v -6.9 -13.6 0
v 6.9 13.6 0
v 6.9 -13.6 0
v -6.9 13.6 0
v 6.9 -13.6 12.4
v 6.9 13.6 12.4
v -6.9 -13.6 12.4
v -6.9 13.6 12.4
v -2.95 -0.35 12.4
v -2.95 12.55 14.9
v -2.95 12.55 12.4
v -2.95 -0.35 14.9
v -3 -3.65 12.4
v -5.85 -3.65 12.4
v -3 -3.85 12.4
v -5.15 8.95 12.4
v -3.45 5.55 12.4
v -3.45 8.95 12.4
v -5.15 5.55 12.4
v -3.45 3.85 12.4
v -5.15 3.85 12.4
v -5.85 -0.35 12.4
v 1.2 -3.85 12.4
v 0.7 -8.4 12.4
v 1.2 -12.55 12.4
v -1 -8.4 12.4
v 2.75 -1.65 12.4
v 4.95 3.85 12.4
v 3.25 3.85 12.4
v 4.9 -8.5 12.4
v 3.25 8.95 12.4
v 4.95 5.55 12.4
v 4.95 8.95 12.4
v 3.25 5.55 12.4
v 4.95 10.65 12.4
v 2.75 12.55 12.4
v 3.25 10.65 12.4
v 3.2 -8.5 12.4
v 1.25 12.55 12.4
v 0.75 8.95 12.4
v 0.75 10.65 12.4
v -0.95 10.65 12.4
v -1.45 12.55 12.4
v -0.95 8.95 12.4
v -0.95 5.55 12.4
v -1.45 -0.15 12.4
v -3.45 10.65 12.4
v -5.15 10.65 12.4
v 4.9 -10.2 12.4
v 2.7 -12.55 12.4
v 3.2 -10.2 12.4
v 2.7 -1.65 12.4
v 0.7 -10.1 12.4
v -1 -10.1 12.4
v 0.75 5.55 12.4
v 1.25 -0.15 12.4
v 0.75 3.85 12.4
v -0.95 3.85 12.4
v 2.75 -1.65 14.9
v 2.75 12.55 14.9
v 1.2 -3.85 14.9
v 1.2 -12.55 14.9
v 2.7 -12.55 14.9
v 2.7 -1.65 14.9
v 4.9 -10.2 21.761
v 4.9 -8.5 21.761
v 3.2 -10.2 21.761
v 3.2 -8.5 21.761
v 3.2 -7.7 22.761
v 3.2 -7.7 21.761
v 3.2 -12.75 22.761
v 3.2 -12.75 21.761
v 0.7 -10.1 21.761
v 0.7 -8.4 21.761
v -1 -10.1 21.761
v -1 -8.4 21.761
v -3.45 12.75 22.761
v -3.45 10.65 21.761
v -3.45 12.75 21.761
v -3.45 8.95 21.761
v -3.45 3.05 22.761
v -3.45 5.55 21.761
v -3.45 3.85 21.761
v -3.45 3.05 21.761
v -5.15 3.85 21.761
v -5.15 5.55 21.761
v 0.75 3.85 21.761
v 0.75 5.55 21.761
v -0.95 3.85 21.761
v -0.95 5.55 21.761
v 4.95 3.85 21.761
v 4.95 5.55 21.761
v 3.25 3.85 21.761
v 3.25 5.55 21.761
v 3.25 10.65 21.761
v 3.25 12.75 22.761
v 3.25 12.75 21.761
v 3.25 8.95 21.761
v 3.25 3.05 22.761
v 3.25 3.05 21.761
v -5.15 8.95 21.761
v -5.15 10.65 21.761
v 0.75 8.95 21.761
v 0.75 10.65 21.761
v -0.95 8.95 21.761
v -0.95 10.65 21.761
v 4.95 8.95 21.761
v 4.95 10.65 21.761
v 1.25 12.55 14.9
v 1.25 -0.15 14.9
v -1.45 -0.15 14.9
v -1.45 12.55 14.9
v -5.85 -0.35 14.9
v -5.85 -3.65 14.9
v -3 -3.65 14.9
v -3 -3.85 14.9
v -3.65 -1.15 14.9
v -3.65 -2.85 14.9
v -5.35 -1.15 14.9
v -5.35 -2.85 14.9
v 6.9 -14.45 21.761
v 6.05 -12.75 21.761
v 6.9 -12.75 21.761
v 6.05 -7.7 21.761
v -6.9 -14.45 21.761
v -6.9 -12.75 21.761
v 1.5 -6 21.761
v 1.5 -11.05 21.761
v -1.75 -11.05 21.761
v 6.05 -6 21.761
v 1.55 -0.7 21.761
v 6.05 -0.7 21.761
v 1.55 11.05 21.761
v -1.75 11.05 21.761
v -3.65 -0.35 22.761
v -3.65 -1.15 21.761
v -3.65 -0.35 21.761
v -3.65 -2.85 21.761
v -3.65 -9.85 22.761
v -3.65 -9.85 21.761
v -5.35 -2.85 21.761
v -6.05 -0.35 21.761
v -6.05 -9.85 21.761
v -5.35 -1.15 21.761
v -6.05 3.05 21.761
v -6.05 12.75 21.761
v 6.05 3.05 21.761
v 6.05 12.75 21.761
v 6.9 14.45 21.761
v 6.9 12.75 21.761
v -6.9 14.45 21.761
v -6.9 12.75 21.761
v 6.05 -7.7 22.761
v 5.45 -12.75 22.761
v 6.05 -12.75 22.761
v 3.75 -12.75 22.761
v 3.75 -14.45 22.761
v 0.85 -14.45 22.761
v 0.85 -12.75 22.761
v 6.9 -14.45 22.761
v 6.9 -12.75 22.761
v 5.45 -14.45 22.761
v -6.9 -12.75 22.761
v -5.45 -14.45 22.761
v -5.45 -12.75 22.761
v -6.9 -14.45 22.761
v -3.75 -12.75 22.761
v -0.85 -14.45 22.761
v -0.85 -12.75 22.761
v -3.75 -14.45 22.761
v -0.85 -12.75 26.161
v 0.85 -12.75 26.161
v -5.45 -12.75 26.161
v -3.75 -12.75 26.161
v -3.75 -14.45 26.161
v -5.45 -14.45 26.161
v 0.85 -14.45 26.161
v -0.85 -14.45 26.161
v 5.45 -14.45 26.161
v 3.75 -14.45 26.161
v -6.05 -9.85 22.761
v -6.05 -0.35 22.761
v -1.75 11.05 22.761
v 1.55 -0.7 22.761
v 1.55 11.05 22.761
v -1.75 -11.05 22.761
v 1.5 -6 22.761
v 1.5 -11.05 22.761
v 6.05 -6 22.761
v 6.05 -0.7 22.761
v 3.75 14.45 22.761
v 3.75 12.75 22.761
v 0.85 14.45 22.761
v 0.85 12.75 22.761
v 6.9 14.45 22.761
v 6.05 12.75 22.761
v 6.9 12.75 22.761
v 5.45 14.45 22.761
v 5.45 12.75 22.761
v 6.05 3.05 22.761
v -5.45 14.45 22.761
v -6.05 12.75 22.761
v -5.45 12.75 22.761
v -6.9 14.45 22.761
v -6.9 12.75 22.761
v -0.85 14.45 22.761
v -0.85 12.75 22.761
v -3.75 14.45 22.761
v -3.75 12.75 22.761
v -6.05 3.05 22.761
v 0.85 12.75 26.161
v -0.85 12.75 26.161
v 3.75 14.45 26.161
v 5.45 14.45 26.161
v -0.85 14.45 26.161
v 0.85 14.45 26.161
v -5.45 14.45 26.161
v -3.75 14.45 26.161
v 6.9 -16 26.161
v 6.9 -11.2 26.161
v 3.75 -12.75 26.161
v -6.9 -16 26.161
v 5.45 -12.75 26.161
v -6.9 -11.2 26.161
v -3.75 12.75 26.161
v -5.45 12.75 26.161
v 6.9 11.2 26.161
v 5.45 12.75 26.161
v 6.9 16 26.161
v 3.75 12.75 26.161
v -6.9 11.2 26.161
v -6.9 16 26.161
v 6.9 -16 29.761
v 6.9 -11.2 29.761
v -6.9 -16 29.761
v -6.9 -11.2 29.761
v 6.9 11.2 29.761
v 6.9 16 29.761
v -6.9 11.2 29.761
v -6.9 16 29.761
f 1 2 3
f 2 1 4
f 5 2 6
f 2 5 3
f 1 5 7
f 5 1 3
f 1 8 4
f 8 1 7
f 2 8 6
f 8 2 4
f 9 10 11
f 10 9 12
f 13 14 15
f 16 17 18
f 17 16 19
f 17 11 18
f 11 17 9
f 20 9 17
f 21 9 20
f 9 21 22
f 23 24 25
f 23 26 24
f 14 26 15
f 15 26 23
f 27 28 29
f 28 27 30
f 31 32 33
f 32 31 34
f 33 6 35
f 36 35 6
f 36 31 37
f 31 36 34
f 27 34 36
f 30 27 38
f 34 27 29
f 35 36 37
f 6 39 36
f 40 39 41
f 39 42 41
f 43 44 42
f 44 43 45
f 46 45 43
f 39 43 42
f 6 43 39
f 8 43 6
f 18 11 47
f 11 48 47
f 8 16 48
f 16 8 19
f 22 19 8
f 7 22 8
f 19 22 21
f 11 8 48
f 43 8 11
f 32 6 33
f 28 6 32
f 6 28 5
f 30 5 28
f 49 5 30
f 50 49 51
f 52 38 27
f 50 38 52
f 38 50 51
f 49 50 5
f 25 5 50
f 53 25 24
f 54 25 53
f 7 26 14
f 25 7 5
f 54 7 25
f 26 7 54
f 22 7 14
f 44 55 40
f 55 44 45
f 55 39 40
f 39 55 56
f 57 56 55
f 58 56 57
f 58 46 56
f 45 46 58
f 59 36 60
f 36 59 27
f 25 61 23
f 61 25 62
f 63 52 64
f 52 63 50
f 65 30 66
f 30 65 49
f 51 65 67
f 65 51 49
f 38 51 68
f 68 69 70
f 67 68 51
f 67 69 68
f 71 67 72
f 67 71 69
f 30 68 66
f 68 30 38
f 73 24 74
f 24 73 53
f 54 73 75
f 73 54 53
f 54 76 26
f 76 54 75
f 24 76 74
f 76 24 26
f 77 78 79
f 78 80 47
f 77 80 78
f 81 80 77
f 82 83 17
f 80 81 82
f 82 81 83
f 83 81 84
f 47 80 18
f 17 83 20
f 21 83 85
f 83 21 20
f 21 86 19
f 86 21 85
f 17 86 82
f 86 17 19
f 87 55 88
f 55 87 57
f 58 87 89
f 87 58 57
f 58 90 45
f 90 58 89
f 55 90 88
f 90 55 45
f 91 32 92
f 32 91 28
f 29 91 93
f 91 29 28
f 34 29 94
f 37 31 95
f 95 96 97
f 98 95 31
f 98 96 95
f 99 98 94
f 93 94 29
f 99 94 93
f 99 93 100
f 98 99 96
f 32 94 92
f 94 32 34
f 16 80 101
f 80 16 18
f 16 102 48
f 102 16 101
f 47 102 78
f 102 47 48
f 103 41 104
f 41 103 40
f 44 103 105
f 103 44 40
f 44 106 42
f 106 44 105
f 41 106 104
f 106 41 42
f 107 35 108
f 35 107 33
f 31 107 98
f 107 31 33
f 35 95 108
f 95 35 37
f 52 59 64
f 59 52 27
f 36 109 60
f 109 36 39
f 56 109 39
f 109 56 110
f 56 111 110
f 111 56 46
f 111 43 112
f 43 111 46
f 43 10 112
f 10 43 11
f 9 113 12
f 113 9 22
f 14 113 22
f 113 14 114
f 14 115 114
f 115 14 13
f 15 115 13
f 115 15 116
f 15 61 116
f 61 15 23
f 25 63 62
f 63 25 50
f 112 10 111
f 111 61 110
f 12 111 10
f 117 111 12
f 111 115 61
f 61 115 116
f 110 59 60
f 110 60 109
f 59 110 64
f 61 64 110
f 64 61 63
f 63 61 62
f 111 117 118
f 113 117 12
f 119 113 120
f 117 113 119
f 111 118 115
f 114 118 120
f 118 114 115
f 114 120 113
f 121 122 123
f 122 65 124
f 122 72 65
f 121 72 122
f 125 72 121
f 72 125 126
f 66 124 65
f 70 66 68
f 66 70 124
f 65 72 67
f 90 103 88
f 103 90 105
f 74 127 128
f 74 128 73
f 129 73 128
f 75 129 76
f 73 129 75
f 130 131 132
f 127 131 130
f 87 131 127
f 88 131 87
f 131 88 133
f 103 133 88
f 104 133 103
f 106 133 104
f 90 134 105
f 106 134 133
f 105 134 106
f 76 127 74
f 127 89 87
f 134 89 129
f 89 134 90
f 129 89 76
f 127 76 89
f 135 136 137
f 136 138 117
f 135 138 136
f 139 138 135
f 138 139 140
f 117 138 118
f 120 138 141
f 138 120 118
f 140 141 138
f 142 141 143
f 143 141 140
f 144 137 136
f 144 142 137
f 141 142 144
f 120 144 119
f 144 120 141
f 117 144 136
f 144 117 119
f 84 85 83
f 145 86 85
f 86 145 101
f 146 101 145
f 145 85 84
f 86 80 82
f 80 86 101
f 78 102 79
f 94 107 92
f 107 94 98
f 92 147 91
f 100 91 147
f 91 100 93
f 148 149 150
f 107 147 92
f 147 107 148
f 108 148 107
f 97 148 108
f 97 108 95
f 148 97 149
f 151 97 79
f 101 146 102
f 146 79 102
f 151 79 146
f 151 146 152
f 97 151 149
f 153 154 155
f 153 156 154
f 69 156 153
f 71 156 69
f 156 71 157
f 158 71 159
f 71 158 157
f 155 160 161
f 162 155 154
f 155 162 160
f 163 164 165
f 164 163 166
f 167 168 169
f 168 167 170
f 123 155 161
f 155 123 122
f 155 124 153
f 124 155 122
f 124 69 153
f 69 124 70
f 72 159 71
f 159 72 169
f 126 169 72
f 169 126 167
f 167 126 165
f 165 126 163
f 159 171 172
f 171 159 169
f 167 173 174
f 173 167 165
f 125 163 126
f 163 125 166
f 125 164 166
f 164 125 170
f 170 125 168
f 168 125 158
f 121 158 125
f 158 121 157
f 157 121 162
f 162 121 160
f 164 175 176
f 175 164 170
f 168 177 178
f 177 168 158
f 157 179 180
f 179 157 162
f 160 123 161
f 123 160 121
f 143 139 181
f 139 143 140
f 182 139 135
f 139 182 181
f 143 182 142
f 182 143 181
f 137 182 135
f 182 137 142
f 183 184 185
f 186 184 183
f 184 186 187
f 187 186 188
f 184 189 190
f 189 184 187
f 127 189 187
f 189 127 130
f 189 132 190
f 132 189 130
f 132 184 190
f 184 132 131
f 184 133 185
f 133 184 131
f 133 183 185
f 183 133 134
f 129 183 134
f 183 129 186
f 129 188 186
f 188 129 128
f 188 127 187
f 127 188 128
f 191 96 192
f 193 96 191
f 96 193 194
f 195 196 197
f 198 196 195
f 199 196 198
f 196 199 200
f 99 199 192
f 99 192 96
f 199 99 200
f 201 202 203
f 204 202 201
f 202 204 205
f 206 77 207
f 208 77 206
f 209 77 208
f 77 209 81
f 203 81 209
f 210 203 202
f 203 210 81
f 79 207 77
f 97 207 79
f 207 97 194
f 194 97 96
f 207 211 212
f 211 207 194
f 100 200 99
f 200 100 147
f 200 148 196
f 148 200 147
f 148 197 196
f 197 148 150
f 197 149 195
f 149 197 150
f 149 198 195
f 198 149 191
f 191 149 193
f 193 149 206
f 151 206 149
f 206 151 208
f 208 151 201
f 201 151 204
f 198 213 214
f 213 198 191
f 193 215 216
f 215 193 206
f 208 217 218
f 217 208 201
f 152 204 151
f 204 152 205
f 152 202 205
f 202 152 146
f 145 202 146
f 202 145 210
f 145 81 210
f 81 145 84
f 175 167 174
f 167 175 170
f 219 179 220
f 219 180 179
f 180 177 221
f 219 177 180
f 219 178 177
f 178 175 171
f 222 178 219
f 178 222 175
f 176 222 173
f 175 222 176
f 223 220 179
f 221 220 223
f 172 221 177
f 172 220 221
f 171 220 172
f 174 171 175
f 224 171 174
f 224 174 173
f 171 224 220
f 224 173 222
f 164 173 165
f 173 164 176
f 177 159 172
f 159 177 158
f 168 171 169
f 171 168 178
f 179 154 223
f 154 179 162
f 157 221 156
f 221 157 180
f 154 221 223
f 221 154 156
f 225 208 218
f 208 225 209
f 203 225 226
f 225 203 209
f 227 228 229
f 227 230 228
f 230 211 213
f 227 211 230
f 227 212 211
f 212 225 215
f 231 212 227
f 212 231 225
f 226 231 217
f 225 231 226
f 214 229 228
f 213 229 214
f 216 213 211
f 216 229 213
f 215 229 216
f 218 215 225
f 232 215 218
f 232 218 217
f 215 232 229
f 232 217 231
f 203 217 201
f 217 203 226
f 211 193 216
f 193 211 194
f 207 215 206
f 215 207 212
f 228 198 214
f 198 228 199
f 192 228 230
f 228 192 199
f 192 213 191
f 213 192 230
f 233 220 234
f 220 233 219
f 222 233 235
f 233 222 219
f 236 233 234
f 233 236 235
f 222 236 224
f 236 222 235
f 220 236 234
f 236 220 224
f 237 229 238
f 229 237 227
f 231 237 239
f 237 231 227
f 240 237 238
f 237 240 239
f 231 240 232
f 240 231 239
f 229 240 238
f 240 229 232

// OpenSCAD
// Generated by SolidPython 0.4.2 on 2020-09-29 23:20:23
//!OpenSCAD

scale(v = 0.0100000000) {
	translate(v = [-690, -1360, 0]) {
		union() {
			color(c = [0.4000000000, 0.4000000000, 0.4000000000]) {
				translate(v = [0, 0, 0]) {
					linear_extrude(height = 1000.0000000000) {
						polygon(paths = [[0, 1, 2, 3]], points = [[0, 0], [0, 2720], [1380, 2720], [1380, 0]]);
					}
				}
			}
			color(c = [0.2000000000, 0.6000000000, 0.2000000000]) {
				translate(v = [0, 0, 1000.0000000000]) {
					linear_extrude(height = 120.0000000000) {
						polygon(paths = [[0, 1, 2, 3]], points = [[0, 1305], [0, 2720], [1380, 2720], [1380, 1305]]);
					}
				}
			}
			color(c = [0.4000000000, 0.4000000000, 0.4000000000]) {
				translate(v = [0, 0, 1000.0000000000]) {
					linear_extrude(height = 120.0000000000) {
						polygon(paths = [[0, 1, 2, 3]], points = [[0, 0], [0, 1305], [1380, 1305], [1380, 0]]);
					}
				}
			}
			color(c = [0.9000000000, 0.6000000000, 0.6000000000]) {
				translate(v = [0, 0, 1120.0000000000]) {
					linear_extrude(height = 120.0000000000) {
						polygon(paths = [[0, 1, 2, 3]], points = [[135, 1645], [135, 2485], [395, 2485], [395, 1645]]);
					}
				}
			}
			color(c = [0.9000000000, 0.6000000000, 0.6000000000]) {
				translate(v = [0, 0, 1120.0000000000]) {
					linear_extrude(height = 120.0000000000) {
						polygon(paths = [[0, 1, 2, 3]], points = [[545, 1645], [545, 2485], [815, 2485], [815, 1645]]);
					}
				}
			}
			color(c = [0.9000000000, 0.6000000000, 0.6000000000]) {
				translate(v = [0, 0, 1120.0000000000]) {
					linear_extrude(height = 120.0000000000) {
						polygon(paths = [[0, 1, 2, 3]], points = [[965, 1645], [965, 2485], [1245, 2485], [1245, 1645]]);
					}
				}
			}
			color(c = [0.9000000000, 0.6000000000, 0.9000000000]) {
				translate(v = [0, 0, 1120.0000000000]) {
					linear_extrude(height = 120.0000000000) {
						polygon(paths = [[0, 1, 2, 3]], points = [[550, 235], [550, 655], [810, 655], [810, 235]]);
					}
				}
			}
			color(c = [0.9000000000, 0.6000000000, 0.9000000000]) {
				translate(v = [0, 0, 1120.0000000000]) {
					linear_extrude(height = 120.0000000000) {
						polygon(paths = [[0, 1, 2, 3]], points = [[960, 235], [960, 655], [1245, 655], [1245, 235]]);
					}
				}
			}
			color(c = [0.2000000000, 0.6000000000, 0.2000000000]) {
				translate(v = [0, 0, 1120.0000000000]) {
					linear_extrude(height = 120.0000000000) {
						difference() {
							polygon(paths = [[0, 1, 2, 3]], points = [[0, 1305], [0, 2720], [1380, 2720], [1380, 1305]]);
							polygon(paths = [[0, 1, 2, 3]], points = [[135, 1645], [395, 1645], [395, 2485], [135, 2485]]);
							polygon(paths = [[0, 1, 2, 3]], points = [[545, 1645], [815, 1645], [815, 2485], [545, 2485]]);
							polygon(paths = [[0, 1, 2, 3]], points = [[965, 1645], [1245, 1645], [1245, 2485], [965, 2485]]);
						}
					}
				}
			}
			color(c = [0.4000000000, 0.4000000000, 0.4000000000]) {
				translate(v = [0, 0, 1120.0000000000]) {
					linear_extrude(height = 120.0000000000) {
						difference() {
							polygon(paths = [[0, 1, 2, 3]], points = [[0, 0], [0, 1305], [1380, 1305], [1380, 0]]);
							polygon(paths = [[0, 1, 2, 3]], points = [[550, 235], [810, 235], [810, 655], [550, 655]]);
							polygon(paths = [[0, 1, 2, 3]], points = [[960, 235], [1245, 235], [1245, 655], [960, 655]]);
						}
					}
				}
			}
			color(c = [0.1000000000, 0.1000000000, 0.1000000000]) {
				translate(v = [0, 0, 1240.0000000000]) {
					linear_extrude(height = 70.0000000000) {
						polygon(paths = [[0, 1, 2, 3]], points = [[1010, 340], [1010, 510], [1180, 510], [1180, 340]]);
					}
				}
			}
			color(c = [0.1000000000, 0.1000000000, 0.1000000000]) {
				translate(v = [0, 0, 1240.0000000000]) {
					linear_extrude(height = 70.0000000000) {
						polygon(paths = [[0, 1, 2, 3]], points = [[590, 350], [590, 520], [760, 520], [760, 350]]);
					}
				}
			}
			color(c = [0.1000000000, 0.1000000000, 0.1000000000]) {
				translate(v = [0, 0, 1240.0000000000]) {
					linear_extrude(height = 70.0000000000) {
						polygon(paths = [[0, 1, 2, 3]], points = [[175, 1745], [175, 1915], [345, 1915], [345, 1745]]);
					}
				}
			}
			color(c = [0.1000000000, 0.1000000000, 0.1000000000]) {
				translate(v = [0, 0, 1240.0000000000]) {
					linear_extrude(height = 70.0000000000) {
						polygon(paths = [[0, 1, 2, 3]], points = [[595, 1745], [595, 1915], [765, 1915], [765, 1745]]);
					}
				}
			}
			color(c = [0.1000000000, 0.1000000000, 0.1000000000]) {
				translate(v = [0, 0, 1240.0000000000]) {
					linear_extrude(height = 70.0000000000) {
						polygon(paths = [[0, 1, 2, 3]], points = [[1015, 1745], [1015, 1915], [1185, 1915], [1185, 1745]]);
					}
				}
			}
			color(c = [0.1000000000, 0.1000000000, 0.1000000000]) {
				translate(v = [0, 0, 1240.0000000000]) {
					linear_extrude(height = 70.0000000000) {
						polygon(paths = [[0, 1, 2, 3]], points = [[175, 2255], [175, 2425], [345, 2425], [345, 2255]]);
					}
				}
			}
			color(c = [0.1000000000, 0.1000000000, 0.1000000000]) {
				translate(v = [0, 0, 1240.0000000000]) {
					linear_extrude(height = 70.0000000000) {
						polygon(paths = [[0, 1, 2, 3]], points = [[595, 2255], [595, 2425], [765, 2425], [765, 2255]]);
					}
				}
			}
			color(c = [0.1000000000, 0.1000000000, 0.1000000000]) {
				translate(v = [0, 0, 1240.0000000000]) {
					linear_extrude(height = 70.0000000000) {
						polygon(paths = [[0, 1, 2, 3]], points = [[1015, 2255], [1015, 2425], [1185, 2425], [1185, 2255]]);
					}
				}
			}
			color(c = [1.0000000000, 1.0000000000, 1.0000000000]) {
				translate(v = [0, 0, 1240.0000000000]) {
					linear_extrude(height = 70.0000000000) {
						polygon(paths = [[0, 1, 2, 3, 4, 5, 6, 7, 8, 9, 10, 11, 12, 13, 14, 15]], points = [[810, 105], [810, 975], [390, 975], [390, 995], [105, 995], [105, 1325], [395, 1325], [395, 2615], [545, 2615], [545, 1345], [815, 1345], [815, 2615], [965, 2615], [965, 1195], [960, 1195], [960, 105]]);
					}
				}
			}
			color(c = [0.1000000000, 0.1000000000, 0.1000000000]) {
				translate(v = [0, 0, 1310.0000000000]) {
					linear_extrude(height = 180.0000000000) {
						polygon(paths = [[0, 1, 2, 3]], points = [[1010, 340], [1010, 510], [1180, 510], [1180, 340]]);
					}
				}
			}
			color(c = [0.1000000000, 0.1000000000, 0.1000000000]) {
				translate(v = [0, 0, 1310.0000000000]) {
					linear_extrude(height = 180.0000000000) {
						polygon(paths = [[0, 1, 2, 3]], points = [[590, 350], [590, 520], [760, 520], [760, 350]]);
					}
				}
			}
			color(c = [0.1000000000, 0.1000000000, 0.1000000000]) {
				translate(v = [0, 0, 1310.0000000000]) {
					linear_extrude(height = 180.0000000000) {
						polygon(paths = [[0, 1, 2, 3]], points = [[175, 1745], [175, 1915], [345, 1915], [345, 1745]]);
					}
				}
			}
			color(c = [0.1000000000, 0.1000000000, 0.1000000000]) {
				translate(v = [0, 0, 1310.0000000000]) {
					linear_extrude(height = 180.0000000000) {
						polygon(paths = [[0, 1, 2, 3]], points = [[595, 1745], [595, 1915], [765, 1915], [765, 1745]]);
					}
				}
			}
			color(c = [0.1000000000, 0.1000000000, 0.1000000000]) {
				translate(v = [0, 0, 1310.0000000000]) {
					linear_extrude(height = 180.0000000000) {
						polygon(paths = [[0, 1, 2, 3]], points = [[1015, 1745], [1015, 1915], [1185, 1915], [1185, 1745]]);
					}
				}
			}
			color(c = [0.1000000000, 0.1000000000, 0.1000000000]) {
				translate(v = [0, 0, 1310.0000000000]) {
					linear_extrude(height = 180.0000000000) {
						polygon(paths = [[0, 1, 2, 3]], points = [[175, 2255], [175, 2425], [345, 2425], [345, 2255]]);
					}
				}
			}
			color(c = [0.1000000000, 0.1000000000, 0.1000000000]) {
				translate(v = [0, 0, 1310.0000000000]) {
					linear_extrude(height = 180.0000000000) {
						polygon(paths = [[0, 1, 2, 3]], points = [[595, 2255], [595, 2425], [765, 2425], [765, 2255]]);
					}
				}
			}
			color(c = [0.1000000000, 0.1000000000, 0.1000000000]) {
				translate(v = [0, 0, 1310.0000000000]) {
					linear_extrude(height = 180.0000000000) {
						polygon(paths = [[0, 1, 2, 3]], points = [[1015, 2255], [1015, 2425], [1185, 2425], [1185, 2255]]);
					}
				}
			}
			color(c = [0.7000000000, 0, 0]) {
				translate(v = [0, 0, 1310.0000000000]) {
					linear_extrude(height = 180.0000000000) {
						polygon(paths = [[0, 1, 2, 3, 4, 5, 6, 7, 8, 9, 10, 11, 12, 13, 14, 15]], points = [[810, 105], [810, 975], [390, 975], [390, 995], [105, 995], [105, 1325], [395, 1325], [395, 2615], [545, 2615], [545, 1345], [815, 1345], [815, 2615], [965, 2615], [965, 1195], [960, 1195], [960, 105]]);
					}
				}
			}
			color(c = [0.1000000000, 0.1000000000, 0.1000000000]) {
				translate(v = [0, 0, 1490.0000000000]) {
					linear_extrude(height = 686.1000000000) {
						polygon(paths = [[0, 1, 2, 3]], points = [[1010, 340], [1010, 510], [1180, 510], [1180, 340]]);
					}
				}
			}
			color(c = [0.1000000000, 0.1000000000, 0.1000000000]) {
				translate(v = [0, 0, 1490.0000000000]) {
					linear_extrude(height = 686.1000000000) {
						polygon(paths = [[0, 1, 2, 3]], points = [[590, 350], [590, 520], [760, 520], [760, 350]]);
					}
				}
			}
			color(c = [0.1000000000, 0.1000000000, 0.1000000000]) {
				translate(v = [0, 0, 1490.0000000000]) {
					linear_extrude(height = 686.1000000000) {
						polygon(paths = [[0, 1, 2, 3]], points = [[155, 1075], [155, 1245], [325, 1245], [325, 1075]]);
					}
				}
			}
			color(c = [0.1000000000, 0.1000000000, 0.1000000000]) {
				translate(v = [0, 0, 1490.0000000000]) {
					linear_extrude(height = 686.1000000000) {
						polygon(paths = [[0, 1, 2, 3]], points = [[175, 1745], [175, 1915], [345, 1915], [345, 1745]]);
					}
				}
			}
			color(c = [0.1000000000, 0.1000000000, 0.1000000000]) {
				translate(v = [0, 0, 1490.0000000000]) {
					linear_extrude(height = 686.1000000000) {
						polygon(paths = [[0, 1, 2, 3]], points = [[595, 1745], [595, 1915], [765, 1915], [765, 1745]]);
					}
				}
			}
			color(c = [0.1000000000, 0.1000000000, 0.1000000000]) {
				translate(v = [0, 0, 1490.0000000000]) {
					linear_extrude(height = 686.1000000000) {
						polygon(paths = [[0, 1, 2, 3]], points = [[1015, 1745], [1015, 1915], [1185, 1915], [1185, 1745]]);
					}
				}
			}
			color(c = [0.1000000000, 0.1000000000, 0.1000000000]) {
				translate(v = [0, 0, 1490.0000000000]) {
					linear_extrude(height = 686.1000000000) {
						polygon(paths = [[0, 1, 2, 3]], points = [[175, 2255], [175, 2425], [345, 2425], [345, 2255]]);
					}
				}
			}
			color(c = [0.1000000000, 0.1000000000, 0.1000000000]) {
				translate(v = [0, 0, 1490.0000000000]) {
					linear_extrude(height = 686.1000000000) {
						polygon(paths = [[0, 1, 2, 3]], points = [[595, 2255], [595, 2425], [765, 2425], [765, 2255]]);
					}
				}
			}
			color(c = [0.1000000000, 0.1000000000, 0.1000000000]) {
				translate(v = [0, 0, 1490.0000000000]) {
					linear_extrude(height = 686.1000000000) {
						polygon(paths = [[0, 1, 2, 3]], points = [[1015, 2255], [1015, 2425], [1185, 2425], [1185, 2255]]);
					}
				}
			}
			color(c = [0.9000000000, 0.6000000000, 0.6000000000]) {
				translate(v = [0, 0, 2176.1000000000]) {
					linear_extrude(height = 100.0000000000) {
						polygon(paths = [[0, 1, 2, 3, 4, 5, 6, 7]], points = [[0, -85], [0, 85], [1010, 85], [1010, 590], [1295, 590], [1295, 85], [1380, 85], [1380, -85]]);
					}
				}
			}
			color(c = [0.9000000000, 0.6000000000, 0.6000000000]) {
				translate(v = [0, 0, 2176.1000000000]) {
					linear_extrude(height = 100.0000000000) {
						polygon(paths = [[0, 1, 2, 3]], points = [[85, 375], [85, 1325], [325, 1325], [325, 375]]);
					}
				}
			}
			color(c = [0.9000000000, 0.6000000000, 0.6000000000]) {
				translate(v = [0, 0, 2176.1000000000]) {
					linear_extrude(height = 100.0000000000) {
						polygon(paths = [[0, 1, 2, 3, 4, 5, 6, 7]], points = [[515, 255], [515, 2465], [845, 2465], [845, 1290], [1295, 1290], [1295, 760], [840, 760], [840, 255]]);
					}
				}
			}
			color(c = [0.9000000000, 0.6000000000, 0.6000000000]) {
				translate(v = [0, 0, 2176.1000000000]) {
					linear_extrude(height = 100.0000000000) {
						polygon(paths = [[0, 1, 2, 3, 4, 5, 6, 7, 8, 9, 10, 11]], points = [[85, 1665], [85, 2635], [0, 2635], [0, 2805], [1380, 2805], [1380, 2635], [1295, 2635], [1295, 1665], [1015, 1665], [1015, 2635], [345, 2635], [345, 1665]]);
					}
				}
			}
			color(c = [0.5000000000, 0.5000000000, 0.5000000000]) {
				translate(v = [0, 0, 2276.1000000000]) {
					linear_extrude(height = 340.0000000000) {
						polygon(paths = [[0, 1, 2, 3]], points = [[145, -85], [145, 85], [315, 85], [315, -85]]);
					}
				}
			}
			color(c = [0.5000000000, 0.5000000000, 0.5000000000]) {
				translate(v = [0, 0, 2276.1000000000]) {
					linear_extrude(height = 340.0000000000) {
						polygon(paths = [[0, 1, 2, 3]], points = [[605, -85], [605, 85], [775, 85], [775, -85]]);
					}
				}
			}
			color(c = [0.5000000000, 0.5000000000, 0.5000000000]) {
				translate(v = [0, 0, 2276.1000000000]) {
					linear_extrude(height = 340.0000000000) {
						polygon(paths = [[0, 1, 2, 3]], points = [[1065, -85], [1065, 85], [1235, 85], [1235, -85]]);
					}
				}
			}
			color(c = [0.5000000000, 0.5000000000, 0.5000000000]) {
				translate(v = [0, 0, 2276.1000000000]) {
					linear_extrude(height = 340.0000000000) {
						polygon(paths = [[0, 1, 2, 3]], points = [[145, 2635], [145, 2805], [315, 2805], [315, 2635]]);
					}
				}
			}
			color(c = [0.5000000000, 0.5000000000, 0.5000000000]) {
				translate(v = [0, 0, 2276.1000000000]) {
					linear_extrude(height = 340.0000000000) {
						polygon(paths = [[0, 1, 2, 3]], points = [[605, 2635], [605, 2805], [775, 2805], [775, 2635]]);
					}
				}
			}
			color(c = [0.5000000000, 0.5000000000, 0.5000000000]) {
				translate(v = [0, 0, 2276.1000000000]) {
					linear_extrude(height = 340.0000000000) {
						polygon(paths = [[0, 1, 2, 3]], points = [[1065, 2635], [1065, 2805], [1235, 2805], [1235, 2635]]);
					}
				}
			}
			color(c = [0.3000000000, 0.3000000000, 1]) {
				translate(v = [0, 0, 2616.1000000000]) {
					linear_extrude(height = 360.0000000000) {
						polygon(paths = [[0, 1, 2, 3]], points = [[0, -240], [0, 240], [1380, 240], [1380, -240]]);
					}
				}
			}
			color(c = [0.3000000000, 0.3000000000, 1]) {
				translate(v = [0, 0, 2616.1000000000]) {
					linear_extrude(height = 360.0000000000) {
						polygon(paths = [[0, 1, 2, 3]], points = [[0, 2480], [0, 2960], [1380, 2960], [1380, 2480]]);
					}
				}
			}
		}
	}
}
